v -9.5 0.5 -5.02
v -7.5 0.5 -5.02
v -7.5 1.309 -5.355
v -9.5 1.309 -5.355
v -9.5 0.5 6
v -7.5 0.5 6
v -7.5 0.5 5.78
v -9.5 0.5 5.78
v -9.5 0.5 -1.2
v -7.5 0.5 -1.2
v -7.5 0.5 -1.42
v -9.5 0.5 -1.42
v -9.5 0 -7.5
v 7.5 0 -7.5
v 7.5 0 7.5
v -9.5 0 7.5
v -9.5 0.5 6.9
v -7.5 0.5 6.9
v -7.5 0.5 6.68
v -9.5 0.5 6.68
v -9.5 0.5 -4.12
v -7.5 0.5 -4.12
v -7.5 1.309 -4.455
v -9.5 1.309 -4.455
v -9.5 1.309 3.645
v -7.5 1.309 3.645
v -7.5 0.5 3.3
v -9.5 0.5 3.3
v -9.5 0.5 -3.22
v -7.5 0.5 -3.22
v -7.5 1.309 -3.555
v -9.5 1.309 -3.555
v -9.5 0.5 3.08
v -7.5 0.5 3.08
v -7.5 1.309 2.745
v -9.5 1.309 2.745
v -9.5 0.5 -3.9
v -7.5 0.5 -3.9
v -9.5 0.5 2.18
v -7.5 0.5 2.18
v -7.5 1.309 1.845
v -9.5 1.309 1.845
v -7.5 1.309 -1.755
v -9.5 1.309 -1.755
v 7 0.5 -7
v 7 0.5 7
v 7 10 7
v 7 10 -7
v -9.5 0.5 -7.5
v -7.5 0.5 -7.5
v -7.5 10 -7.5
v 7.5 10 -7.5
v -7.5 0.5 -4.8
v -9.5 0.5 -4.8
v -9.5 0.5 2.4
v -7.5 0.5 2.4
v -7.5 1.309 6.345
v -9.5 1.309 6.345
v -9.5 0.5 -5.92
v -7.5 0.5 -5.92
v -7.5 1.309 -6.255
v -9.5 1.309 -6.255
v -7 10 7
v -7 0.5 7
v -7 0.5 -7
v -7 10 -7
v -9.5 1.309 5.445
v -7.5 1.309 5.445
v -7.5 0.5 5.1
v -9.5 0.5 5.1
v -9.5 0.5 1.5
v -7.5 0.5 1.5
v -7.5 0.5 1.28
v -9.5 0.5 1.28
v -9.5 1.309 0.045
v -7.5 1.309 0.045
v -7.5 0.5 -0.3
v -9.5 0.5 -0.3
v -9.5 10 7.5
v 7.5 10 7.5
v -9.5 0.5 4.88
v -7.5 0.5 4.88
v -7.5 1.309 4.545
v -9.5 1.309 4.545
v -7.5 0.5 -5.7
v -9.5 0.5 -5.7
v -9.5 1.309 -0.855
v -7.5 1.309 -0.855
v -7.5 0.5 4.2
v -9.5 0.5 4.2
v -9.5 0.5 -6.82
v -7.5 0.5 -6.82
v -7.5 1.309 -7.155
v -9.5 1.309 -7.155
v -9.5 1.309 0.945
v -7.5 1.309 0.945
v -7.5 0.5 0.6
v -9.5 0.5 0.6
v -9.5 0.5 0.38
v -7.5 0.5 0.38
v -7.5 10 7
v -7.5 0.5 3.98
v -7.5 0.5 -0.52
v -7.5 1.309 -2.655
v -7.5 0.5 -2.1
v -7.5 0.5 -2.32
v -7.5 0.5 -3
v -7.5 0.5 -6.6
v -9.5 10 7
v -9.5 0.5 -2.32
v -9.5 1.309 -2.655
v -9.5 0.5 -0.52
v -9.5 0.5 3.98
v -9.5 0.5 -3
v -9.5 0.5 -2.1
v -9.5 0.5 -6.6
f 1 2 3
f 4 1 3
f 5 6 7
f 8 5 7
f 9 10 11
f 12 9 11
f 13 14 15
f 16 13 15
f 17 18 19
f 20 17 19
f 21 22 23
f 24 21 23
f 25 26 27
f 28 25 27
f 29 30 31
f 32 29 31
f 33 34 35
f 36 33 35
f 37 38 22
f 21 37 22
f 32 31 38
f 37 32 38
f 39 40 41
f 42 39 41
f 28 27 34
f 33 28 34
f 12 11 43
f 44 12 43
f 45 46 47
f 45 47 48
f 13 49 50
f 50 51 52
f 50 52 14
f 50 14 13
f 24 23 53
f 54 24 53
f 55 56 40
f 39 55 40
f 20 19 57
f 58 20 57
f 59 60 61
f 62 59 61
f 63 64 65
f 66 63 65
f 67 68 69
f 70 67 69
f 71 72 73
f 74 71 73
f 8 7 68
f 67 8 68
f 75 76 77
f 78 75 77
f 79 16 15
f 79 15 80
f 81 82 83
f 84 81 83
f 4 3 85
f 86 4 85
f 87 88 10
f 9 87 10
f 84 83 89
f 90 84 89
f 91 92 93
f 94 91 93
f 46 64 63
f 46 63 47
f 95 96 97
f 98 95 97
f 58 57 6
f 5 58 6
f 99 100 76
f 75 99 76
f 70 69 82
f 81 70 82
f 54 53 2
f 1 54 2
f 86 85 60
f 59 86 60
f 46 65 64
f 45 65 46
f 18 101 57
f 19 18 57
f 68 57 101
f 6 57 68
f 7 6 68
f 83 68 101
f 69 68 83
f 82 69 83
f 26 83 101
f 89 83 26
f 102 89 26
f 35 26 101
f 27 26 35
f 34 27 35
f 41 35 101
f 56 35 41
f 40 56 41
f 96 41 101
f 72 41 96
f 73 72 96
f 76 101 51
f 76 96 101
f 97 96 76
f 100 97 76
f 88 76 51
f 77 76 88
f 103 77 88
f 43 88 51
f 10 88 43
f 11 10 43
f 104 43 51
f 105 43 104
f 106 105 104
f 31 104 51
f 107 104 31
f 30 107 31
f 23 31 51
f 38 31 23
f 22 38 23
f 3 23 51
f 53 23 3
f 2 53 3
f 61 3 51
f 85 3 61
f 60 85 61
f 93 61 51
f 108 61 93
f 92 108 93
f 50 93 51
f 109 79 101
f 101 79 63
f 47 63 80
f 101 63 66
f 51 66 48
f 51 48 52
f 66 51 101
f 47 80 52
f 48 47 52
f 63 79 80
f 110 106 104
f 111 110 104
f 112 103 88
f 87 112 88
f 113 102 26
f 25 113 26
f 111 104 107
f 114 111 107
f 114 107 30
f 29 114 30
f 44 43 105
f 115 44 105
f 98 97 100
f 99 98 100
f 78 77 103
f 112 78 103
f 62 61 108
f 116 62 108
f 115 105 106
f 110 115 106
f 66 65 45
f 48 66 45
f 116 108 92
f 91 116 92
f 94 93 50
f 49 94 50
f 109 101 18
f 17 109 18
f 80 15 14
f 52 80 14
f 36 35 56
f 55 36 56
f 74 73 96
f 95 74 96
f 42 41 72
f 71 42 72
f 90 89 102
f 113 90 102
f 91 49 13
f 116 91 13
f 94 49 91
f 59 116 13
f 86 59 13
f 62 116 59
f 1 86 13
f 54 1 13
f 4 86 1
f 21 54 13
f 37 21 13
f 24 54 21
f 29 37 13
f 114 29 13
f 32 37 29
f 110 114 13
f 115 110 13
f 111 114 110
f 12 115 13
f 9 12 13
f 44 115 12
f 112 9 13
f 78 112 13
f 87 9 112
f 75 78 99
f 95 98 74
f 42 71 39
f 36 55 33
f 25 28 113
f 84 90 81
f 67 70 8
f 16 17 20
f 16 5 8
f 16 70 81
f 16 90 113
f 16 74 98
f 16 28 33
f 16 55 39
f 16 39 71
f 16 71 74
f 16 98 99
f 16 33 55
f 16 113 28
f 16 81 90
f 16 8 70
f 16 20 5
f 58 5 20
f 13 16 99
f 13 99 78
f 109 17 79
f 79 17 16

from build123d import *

# Parameters (mm, degrees)
SKETCH1_W           = 15
SKETCH1_H           = 15
BOSS_EXTRUDE1_DEPTH = 10
SHELL6_T            = -0.5
BOSS_EXTRUDE3_DEPTH = 2


with BuildPart() as part:
    # Sketch1 → Boss-Extrude1 (new body)
    with BuildSketch(Plane(origin=(0, 0, 0), x_dir=(1, 0, 0), z_dir=(0, 1, 0))):
        Rectangle(SKETCH1_W, SKETCH1_H)
    extrude(amount=BOSS_EXTRUDE1_DEPTH)

    # Shell6
    shell6_openings = [part.faces().sort_by_distance(p)[0] for p in [
        (0, 10, 0),
    ]]
    offset(amount=SHELL6_T, openings=shell6_openings, kind=Kind.INTERSECTION)

    # Sketch2 → Boss-Extrude3 (add)
    with BuildSketch(Plane.ZY.offset(7.5)):
        Polygon((-7.5, 0), (7.5, 0), (7.5, 0.5), (7.5, 10), (7, 10), (6.9, 0.5), (6.680102085, 0.5), (6.345384733, 1.309388279), (6, 0.5), (5.780102085, 0.5), (5.445384733, 1.309388279), (5.1, 0.5), (4.880102085, 0.5), (4.545384733, 1.309388279), (4.2, 0.5), (3.980102085, 0.5), (3.645384733, 1.309388279), (3.3, 0.5), (3.080102085, 0.5), (2.745384733, 1.309388279), (2.4, 0.5), (2.180102085, 0.5), (1.845384733, 1.309388279), (1.5, 0.5), (1.280102085, 0.5), (0.945384733, 1.309388279), (0.6, 0.5), (0.380102085, 0.5), (0.045384733, 1.309388279), (-0.3, 0.5), (-0.519897915, 0.5), (-0.854615267, 1.309388279), (-1.2, 0.5), (-1.419897915, 0.5), (-1.754615267, 1.309388279), (-2.1, 0.5), (-2.319897915, 0.5), (-2.654615267, 1.309388279), (-3, 0.5), (-3.219897915, 0.5), (-3.554615267, 1.309388279), (-3.9, 0.5), (-4.119897915, 0.5), (-4.454615267, 1.309388279), (-4.8, 0.5), (-5.019897915, 0.5), (-5.354615267, 1.309388279), (-5.7, 0.5), (-5.919897915, 0.5), (-6.254615267, 1.309388279), (-6.6, 0.5), (-6.819897915, 0.5), (-7.154615267, 1.309388279), (-7.5, 0.5), align=None)
    extrude(amount=BOSS_EXTRUDE3_DEPTH)


solid = part.part
